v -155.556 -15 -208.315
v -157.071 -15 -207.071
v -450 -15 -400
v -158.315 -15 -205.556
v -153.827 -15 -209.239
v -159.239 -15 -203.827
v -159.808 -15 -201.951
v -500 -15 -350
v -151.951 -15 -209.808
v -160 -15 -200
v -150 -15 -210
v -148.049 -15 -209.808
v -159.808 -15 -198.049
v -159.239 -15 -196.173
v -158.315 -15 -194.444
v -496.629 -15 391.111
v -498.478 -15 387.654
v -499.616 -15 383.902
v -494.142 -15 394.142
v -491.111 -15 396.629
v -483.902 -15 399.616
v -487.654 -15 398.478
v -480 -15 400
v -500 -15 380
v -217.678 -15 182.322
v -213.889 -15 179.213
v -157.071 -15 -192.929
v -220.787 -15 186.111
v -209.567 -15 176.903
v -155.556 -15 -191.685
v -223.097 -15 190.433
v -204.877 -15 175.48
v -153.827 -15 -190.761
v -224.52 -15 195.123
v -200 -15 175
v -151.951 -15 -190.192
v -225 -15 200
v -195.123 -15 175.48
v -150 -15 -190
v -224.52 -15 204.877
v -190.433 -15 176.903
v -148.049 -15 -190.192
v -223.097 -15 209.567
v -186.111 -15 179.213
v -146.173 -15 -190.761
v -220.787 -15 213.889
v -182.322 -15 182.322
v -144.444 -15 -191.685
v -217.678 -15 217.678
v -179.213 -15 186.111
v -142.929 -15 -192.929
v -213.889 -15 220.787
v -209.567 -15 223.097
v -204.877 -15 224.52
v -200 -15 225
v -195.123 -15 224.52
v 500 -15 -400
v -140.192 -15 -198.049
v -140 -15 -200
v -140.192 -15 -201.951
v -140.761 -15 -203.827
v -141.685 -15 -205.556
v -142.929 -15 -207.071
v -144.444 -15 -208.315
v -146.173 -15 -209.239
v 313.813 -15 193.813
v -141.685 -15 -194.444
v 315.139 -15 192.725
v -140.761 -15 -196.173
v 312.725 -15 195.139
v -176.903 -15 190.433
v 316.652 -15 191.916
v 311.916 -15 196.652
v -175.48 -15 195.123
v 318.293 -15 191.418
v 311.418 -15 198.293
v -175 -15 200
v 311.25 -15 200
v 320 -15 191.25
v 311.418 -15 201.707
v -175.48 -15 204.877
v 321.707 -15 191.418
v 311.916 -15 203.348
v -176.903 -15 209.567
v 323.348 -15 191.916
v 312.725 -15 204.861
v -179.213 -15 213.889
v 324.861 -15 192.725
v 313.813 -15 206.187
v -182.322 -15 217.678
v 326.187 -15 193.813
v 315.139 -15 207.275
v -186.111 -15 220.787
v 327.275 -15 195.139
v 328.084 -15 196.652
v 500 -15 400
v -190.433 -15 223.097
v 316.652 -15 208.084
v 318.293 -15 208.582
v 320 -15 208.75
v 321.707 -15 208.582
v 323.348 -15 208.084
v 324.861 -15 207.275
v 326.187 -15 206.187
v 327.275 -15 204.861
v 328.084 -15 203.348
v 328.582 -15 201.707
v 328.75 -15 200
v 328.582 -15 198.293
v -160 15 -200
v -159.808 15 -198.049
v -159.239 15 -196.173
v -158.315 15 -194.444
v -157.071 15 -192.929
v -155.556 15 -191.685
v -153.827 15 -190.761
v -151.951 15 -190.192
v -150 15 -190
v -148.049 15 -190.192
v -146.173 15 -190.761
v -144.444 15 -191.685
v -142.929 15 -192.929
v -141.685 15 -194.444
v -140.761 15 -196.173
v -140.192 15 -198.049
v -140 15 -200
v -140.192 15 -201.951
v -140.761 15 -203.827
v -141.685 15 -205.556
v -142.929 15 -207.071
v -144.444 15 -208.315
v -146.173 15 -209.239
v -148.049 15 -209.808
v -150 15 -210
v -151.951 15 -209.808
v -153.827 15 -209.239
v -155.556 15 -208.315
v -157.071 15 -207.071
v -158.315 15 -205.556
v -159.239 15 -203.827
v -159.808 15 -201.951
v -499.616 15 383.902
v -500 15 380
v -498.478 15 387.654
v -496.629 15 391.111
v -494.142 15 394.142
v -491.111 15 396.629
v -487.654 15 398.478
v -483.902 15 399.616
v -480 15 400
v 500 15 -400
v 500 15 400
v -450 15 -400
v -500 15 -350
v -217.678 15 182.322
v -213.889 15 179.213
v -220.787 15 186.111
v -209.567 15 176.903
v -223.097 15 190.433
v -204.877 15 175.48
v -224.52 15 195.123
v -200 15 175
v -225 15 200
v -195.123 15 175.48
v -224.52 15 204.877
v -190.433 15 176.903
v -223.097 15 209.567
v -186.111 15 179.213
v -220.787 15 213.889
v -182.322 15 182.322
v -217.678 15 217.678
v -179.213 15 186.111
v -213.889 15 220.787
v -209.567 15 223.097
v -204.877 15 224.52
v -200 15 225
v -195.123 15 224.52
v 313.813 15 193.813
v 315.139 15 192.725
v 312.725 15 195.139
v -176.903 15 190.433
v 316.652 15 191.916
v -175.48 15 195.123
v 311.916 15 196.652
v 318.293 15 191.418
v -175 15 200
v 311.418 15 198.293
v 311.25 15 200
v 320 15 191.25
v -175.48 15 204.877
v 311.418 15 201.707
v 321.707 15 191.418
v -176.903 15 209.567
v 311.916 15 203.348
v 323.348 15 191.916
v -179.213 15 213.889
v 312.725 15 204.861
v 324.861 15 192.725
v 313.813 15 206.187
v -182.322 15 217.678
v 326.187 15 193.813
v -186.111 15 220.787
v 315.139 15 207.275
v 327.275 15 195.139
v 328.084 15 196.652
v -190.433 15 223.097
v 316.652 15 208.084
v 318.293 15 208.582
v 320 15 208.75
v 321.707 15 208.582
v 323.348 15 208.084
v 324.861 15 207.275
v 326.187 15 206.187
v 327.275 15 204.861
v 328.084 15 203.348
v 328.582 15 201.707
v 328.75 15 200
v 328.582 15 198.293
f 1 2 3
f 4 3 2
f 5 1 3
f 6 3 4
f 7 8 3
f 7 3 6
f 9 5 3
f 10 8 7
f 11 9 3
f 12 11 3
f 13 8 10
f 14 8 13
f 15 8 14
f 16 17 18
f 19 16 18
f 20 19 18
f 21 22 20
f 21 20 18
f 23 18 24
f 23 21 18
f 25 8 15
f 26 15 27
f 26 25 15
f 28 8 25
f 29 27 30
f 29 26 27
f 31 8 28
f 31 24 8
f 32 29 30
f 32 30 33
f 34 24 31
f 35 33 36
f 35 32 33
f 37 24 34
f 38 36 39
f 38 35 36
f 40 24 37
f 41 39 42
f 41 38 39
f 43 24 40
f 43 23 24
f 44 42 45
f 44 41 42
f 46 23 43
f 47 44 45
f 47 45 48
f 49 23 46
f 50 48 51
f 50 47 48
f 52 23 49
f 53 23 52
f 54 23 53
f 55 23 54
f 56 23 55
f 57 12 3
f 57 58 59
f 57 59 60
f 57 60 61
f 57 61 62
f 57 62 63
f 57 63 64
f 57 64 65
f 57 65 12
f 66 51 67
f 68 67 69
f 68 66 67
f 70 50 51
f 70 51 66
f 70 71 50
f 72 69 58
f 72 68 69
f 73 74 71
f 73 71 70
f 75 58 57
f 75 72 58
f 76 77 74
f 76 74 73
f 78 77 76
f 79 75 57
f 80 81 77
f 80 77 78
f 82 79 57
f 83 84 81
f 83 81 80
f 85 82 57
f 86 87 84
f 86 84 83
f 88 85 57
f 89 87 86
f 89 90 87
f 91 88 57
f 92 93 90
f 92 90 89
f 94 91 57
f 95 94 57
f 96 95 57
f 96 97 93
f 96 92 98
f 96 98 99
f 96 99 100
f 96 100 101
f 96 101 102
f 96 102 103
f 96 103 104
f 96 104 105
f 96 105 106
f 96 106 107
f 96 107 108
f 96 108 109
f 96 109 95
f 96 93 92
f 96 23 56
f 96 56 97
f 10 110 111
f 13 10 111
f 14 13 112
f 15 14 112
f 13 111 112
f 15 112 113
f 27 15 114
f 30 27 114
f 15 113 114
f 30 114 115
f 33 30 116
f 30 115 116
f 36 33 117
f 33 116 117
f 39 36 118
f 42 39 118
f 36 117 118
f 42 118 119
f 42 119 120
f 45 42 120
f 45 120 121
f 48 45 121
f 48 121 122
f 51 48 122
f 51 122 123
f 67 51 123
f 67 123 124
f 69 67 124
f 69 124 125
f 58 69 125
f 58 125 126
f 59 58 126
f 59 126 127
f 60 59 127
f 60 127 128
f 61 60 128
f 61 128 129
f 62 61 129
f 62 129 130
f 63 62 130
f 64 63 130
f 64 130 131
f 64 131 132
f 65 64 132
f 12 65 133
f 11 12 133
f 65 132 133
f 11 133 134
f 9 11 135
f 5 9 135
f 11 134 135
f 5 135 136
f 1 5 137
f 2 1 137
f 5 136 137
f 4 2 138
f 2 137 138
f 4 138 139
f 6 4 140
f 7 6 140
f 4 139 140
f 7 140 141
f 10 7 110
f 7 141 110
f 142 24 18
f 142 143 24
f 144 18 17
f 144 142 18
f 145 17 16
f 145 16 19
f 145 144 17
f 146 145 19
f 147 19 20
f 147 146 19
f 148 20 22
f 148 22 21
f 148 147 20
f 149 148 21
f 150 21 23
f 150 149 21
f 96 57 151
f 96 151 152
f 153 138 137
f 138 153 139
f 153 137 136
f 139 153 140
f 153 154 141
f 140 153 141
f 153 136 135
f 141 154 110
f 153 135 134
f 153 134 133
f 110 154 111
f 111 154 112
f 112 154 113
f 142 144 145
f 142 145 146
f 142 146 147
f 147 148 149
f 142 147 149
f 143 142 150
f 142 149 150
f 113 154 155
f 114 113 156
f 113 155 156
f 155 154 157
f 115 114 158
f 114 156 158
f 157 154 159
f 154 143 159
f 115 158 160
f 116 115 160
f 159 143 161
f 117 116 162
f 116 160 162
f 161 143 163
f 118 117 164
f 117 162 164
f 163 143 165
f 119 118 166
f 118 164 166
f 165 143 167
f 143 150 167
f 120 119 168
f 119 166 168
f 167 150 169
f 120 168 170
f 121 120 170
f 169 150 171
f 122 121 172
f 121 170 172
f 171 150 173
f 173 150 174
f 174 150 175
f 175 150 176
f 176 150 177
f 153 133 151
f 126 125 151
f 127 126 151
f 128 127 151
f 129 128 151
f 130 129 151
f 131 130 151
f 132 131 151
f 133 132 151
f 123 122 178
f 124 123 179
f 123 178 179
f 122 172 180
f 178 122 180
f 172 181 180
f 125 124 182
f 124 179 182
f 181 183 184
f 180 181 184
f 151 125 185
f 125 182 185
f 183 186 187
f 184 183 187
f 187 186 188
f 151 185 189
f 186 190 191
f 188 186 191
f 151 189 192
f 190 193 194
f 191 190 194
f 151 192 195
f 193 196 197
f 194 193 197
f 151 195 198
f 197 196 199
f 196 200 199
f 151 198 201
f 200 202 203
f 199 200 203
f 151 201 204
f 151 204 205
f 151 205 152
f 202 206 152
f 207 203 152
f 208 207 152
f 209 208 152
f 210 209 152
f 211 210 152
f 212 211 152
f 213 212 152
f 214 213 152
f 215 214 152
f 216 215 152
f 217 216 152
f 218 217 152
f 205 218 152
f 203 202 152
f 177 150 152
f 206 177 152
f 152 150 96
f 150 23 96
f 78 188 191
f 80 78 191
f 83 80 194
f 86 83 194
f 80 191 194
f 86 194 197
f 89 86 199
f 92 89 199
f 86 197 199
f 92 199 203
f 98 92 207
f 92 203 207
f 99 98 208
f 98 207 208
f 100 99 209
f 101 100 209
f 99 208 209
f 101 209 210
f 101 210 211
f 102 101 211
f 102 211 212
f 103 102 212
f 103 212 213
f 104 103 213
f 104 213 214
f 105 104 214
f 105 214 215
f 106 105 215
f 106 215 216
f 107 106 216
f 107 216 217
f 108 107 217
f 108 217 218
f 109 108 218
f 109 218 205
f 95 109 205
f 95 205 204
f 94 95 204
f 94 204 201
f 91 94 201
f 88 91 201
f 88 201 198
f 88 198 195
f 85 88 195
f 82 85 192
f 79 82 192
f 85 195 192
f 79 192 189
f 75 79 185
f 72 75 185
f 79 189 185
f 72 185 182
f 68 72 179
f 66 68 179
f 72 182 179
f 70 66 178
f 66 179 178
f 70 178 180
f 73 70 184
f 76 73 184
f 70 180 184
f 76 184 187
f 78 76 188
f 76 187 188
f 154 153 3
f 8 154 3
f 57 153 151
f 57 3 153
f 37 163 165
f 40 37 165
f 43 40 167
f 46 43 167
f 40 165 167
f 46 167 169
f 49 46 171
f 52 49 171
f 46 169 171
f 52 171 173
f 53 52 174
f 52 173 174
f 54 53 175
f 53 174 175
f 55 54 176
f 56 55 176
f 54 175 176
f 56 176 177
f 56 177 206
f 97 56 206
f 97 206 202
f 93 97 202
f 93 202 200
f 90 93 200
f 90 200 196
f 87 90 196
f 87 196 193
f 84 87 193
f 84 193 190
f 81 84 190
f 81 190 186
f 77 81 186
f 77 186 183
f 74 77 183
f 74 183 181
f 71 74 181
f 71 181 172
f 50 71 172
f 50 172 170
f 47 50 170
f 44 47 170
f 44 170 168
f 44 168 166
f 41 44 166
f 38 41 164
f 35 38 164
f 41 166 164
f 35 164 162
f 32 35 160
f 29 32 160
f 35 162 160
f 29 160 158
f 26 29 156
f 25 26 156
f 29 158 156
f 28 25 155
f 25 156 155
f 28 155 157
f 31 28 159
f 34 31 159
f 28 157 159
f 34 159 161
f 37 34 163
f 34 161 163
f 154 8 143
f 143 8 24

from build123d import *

# Parameters (mm, degrees)
F0_W     = 1000
F0_H     = 800
F1_DEPTH = 15
F3_D     = 50
F4_D     = 20
F5_D     = 17.5
F6_R     = 20
F7_SIZE  = 50


with BuildPart() as f1:
    # F0 (on Front) → F1 (new body, symmetric)
    with BuildSketch(Plane.XZ):
        Rectangle(F0_W, F0_H)
    extrude(amount=F1_DEPTH, both=True)

    # F3 (through all)
    with Locations(Plane.XZ.offset(15)):
        with Locations((-200, 200)):
            Hole(F3_D / 2)

    # F4 (through all)
    with Locations(Plane.XZ.offset(15)):
        with Locations((-150, -200)):
            Hole(F4_D / 2)

    # F5 (through all)
    with Locations(Plane.XZ.offset(15)):
        with Locations((320, 200)):
            Hole(F5_D / 2)

    # F6
    f6_edges = [f1.edges().sort_by_distance(p)[0] for p in [
        (-500, 0, 400),
    ]]
    fillet(f6_edges, radius=F6_R)

    # F7
    f7_edges = [f1.edges().sort_by_distance(p)[0] for p in [
        (-500, 0, -400),
    ]]
    chamfer(f7_edges, length=F7_SIZE)


solid = f1.part
